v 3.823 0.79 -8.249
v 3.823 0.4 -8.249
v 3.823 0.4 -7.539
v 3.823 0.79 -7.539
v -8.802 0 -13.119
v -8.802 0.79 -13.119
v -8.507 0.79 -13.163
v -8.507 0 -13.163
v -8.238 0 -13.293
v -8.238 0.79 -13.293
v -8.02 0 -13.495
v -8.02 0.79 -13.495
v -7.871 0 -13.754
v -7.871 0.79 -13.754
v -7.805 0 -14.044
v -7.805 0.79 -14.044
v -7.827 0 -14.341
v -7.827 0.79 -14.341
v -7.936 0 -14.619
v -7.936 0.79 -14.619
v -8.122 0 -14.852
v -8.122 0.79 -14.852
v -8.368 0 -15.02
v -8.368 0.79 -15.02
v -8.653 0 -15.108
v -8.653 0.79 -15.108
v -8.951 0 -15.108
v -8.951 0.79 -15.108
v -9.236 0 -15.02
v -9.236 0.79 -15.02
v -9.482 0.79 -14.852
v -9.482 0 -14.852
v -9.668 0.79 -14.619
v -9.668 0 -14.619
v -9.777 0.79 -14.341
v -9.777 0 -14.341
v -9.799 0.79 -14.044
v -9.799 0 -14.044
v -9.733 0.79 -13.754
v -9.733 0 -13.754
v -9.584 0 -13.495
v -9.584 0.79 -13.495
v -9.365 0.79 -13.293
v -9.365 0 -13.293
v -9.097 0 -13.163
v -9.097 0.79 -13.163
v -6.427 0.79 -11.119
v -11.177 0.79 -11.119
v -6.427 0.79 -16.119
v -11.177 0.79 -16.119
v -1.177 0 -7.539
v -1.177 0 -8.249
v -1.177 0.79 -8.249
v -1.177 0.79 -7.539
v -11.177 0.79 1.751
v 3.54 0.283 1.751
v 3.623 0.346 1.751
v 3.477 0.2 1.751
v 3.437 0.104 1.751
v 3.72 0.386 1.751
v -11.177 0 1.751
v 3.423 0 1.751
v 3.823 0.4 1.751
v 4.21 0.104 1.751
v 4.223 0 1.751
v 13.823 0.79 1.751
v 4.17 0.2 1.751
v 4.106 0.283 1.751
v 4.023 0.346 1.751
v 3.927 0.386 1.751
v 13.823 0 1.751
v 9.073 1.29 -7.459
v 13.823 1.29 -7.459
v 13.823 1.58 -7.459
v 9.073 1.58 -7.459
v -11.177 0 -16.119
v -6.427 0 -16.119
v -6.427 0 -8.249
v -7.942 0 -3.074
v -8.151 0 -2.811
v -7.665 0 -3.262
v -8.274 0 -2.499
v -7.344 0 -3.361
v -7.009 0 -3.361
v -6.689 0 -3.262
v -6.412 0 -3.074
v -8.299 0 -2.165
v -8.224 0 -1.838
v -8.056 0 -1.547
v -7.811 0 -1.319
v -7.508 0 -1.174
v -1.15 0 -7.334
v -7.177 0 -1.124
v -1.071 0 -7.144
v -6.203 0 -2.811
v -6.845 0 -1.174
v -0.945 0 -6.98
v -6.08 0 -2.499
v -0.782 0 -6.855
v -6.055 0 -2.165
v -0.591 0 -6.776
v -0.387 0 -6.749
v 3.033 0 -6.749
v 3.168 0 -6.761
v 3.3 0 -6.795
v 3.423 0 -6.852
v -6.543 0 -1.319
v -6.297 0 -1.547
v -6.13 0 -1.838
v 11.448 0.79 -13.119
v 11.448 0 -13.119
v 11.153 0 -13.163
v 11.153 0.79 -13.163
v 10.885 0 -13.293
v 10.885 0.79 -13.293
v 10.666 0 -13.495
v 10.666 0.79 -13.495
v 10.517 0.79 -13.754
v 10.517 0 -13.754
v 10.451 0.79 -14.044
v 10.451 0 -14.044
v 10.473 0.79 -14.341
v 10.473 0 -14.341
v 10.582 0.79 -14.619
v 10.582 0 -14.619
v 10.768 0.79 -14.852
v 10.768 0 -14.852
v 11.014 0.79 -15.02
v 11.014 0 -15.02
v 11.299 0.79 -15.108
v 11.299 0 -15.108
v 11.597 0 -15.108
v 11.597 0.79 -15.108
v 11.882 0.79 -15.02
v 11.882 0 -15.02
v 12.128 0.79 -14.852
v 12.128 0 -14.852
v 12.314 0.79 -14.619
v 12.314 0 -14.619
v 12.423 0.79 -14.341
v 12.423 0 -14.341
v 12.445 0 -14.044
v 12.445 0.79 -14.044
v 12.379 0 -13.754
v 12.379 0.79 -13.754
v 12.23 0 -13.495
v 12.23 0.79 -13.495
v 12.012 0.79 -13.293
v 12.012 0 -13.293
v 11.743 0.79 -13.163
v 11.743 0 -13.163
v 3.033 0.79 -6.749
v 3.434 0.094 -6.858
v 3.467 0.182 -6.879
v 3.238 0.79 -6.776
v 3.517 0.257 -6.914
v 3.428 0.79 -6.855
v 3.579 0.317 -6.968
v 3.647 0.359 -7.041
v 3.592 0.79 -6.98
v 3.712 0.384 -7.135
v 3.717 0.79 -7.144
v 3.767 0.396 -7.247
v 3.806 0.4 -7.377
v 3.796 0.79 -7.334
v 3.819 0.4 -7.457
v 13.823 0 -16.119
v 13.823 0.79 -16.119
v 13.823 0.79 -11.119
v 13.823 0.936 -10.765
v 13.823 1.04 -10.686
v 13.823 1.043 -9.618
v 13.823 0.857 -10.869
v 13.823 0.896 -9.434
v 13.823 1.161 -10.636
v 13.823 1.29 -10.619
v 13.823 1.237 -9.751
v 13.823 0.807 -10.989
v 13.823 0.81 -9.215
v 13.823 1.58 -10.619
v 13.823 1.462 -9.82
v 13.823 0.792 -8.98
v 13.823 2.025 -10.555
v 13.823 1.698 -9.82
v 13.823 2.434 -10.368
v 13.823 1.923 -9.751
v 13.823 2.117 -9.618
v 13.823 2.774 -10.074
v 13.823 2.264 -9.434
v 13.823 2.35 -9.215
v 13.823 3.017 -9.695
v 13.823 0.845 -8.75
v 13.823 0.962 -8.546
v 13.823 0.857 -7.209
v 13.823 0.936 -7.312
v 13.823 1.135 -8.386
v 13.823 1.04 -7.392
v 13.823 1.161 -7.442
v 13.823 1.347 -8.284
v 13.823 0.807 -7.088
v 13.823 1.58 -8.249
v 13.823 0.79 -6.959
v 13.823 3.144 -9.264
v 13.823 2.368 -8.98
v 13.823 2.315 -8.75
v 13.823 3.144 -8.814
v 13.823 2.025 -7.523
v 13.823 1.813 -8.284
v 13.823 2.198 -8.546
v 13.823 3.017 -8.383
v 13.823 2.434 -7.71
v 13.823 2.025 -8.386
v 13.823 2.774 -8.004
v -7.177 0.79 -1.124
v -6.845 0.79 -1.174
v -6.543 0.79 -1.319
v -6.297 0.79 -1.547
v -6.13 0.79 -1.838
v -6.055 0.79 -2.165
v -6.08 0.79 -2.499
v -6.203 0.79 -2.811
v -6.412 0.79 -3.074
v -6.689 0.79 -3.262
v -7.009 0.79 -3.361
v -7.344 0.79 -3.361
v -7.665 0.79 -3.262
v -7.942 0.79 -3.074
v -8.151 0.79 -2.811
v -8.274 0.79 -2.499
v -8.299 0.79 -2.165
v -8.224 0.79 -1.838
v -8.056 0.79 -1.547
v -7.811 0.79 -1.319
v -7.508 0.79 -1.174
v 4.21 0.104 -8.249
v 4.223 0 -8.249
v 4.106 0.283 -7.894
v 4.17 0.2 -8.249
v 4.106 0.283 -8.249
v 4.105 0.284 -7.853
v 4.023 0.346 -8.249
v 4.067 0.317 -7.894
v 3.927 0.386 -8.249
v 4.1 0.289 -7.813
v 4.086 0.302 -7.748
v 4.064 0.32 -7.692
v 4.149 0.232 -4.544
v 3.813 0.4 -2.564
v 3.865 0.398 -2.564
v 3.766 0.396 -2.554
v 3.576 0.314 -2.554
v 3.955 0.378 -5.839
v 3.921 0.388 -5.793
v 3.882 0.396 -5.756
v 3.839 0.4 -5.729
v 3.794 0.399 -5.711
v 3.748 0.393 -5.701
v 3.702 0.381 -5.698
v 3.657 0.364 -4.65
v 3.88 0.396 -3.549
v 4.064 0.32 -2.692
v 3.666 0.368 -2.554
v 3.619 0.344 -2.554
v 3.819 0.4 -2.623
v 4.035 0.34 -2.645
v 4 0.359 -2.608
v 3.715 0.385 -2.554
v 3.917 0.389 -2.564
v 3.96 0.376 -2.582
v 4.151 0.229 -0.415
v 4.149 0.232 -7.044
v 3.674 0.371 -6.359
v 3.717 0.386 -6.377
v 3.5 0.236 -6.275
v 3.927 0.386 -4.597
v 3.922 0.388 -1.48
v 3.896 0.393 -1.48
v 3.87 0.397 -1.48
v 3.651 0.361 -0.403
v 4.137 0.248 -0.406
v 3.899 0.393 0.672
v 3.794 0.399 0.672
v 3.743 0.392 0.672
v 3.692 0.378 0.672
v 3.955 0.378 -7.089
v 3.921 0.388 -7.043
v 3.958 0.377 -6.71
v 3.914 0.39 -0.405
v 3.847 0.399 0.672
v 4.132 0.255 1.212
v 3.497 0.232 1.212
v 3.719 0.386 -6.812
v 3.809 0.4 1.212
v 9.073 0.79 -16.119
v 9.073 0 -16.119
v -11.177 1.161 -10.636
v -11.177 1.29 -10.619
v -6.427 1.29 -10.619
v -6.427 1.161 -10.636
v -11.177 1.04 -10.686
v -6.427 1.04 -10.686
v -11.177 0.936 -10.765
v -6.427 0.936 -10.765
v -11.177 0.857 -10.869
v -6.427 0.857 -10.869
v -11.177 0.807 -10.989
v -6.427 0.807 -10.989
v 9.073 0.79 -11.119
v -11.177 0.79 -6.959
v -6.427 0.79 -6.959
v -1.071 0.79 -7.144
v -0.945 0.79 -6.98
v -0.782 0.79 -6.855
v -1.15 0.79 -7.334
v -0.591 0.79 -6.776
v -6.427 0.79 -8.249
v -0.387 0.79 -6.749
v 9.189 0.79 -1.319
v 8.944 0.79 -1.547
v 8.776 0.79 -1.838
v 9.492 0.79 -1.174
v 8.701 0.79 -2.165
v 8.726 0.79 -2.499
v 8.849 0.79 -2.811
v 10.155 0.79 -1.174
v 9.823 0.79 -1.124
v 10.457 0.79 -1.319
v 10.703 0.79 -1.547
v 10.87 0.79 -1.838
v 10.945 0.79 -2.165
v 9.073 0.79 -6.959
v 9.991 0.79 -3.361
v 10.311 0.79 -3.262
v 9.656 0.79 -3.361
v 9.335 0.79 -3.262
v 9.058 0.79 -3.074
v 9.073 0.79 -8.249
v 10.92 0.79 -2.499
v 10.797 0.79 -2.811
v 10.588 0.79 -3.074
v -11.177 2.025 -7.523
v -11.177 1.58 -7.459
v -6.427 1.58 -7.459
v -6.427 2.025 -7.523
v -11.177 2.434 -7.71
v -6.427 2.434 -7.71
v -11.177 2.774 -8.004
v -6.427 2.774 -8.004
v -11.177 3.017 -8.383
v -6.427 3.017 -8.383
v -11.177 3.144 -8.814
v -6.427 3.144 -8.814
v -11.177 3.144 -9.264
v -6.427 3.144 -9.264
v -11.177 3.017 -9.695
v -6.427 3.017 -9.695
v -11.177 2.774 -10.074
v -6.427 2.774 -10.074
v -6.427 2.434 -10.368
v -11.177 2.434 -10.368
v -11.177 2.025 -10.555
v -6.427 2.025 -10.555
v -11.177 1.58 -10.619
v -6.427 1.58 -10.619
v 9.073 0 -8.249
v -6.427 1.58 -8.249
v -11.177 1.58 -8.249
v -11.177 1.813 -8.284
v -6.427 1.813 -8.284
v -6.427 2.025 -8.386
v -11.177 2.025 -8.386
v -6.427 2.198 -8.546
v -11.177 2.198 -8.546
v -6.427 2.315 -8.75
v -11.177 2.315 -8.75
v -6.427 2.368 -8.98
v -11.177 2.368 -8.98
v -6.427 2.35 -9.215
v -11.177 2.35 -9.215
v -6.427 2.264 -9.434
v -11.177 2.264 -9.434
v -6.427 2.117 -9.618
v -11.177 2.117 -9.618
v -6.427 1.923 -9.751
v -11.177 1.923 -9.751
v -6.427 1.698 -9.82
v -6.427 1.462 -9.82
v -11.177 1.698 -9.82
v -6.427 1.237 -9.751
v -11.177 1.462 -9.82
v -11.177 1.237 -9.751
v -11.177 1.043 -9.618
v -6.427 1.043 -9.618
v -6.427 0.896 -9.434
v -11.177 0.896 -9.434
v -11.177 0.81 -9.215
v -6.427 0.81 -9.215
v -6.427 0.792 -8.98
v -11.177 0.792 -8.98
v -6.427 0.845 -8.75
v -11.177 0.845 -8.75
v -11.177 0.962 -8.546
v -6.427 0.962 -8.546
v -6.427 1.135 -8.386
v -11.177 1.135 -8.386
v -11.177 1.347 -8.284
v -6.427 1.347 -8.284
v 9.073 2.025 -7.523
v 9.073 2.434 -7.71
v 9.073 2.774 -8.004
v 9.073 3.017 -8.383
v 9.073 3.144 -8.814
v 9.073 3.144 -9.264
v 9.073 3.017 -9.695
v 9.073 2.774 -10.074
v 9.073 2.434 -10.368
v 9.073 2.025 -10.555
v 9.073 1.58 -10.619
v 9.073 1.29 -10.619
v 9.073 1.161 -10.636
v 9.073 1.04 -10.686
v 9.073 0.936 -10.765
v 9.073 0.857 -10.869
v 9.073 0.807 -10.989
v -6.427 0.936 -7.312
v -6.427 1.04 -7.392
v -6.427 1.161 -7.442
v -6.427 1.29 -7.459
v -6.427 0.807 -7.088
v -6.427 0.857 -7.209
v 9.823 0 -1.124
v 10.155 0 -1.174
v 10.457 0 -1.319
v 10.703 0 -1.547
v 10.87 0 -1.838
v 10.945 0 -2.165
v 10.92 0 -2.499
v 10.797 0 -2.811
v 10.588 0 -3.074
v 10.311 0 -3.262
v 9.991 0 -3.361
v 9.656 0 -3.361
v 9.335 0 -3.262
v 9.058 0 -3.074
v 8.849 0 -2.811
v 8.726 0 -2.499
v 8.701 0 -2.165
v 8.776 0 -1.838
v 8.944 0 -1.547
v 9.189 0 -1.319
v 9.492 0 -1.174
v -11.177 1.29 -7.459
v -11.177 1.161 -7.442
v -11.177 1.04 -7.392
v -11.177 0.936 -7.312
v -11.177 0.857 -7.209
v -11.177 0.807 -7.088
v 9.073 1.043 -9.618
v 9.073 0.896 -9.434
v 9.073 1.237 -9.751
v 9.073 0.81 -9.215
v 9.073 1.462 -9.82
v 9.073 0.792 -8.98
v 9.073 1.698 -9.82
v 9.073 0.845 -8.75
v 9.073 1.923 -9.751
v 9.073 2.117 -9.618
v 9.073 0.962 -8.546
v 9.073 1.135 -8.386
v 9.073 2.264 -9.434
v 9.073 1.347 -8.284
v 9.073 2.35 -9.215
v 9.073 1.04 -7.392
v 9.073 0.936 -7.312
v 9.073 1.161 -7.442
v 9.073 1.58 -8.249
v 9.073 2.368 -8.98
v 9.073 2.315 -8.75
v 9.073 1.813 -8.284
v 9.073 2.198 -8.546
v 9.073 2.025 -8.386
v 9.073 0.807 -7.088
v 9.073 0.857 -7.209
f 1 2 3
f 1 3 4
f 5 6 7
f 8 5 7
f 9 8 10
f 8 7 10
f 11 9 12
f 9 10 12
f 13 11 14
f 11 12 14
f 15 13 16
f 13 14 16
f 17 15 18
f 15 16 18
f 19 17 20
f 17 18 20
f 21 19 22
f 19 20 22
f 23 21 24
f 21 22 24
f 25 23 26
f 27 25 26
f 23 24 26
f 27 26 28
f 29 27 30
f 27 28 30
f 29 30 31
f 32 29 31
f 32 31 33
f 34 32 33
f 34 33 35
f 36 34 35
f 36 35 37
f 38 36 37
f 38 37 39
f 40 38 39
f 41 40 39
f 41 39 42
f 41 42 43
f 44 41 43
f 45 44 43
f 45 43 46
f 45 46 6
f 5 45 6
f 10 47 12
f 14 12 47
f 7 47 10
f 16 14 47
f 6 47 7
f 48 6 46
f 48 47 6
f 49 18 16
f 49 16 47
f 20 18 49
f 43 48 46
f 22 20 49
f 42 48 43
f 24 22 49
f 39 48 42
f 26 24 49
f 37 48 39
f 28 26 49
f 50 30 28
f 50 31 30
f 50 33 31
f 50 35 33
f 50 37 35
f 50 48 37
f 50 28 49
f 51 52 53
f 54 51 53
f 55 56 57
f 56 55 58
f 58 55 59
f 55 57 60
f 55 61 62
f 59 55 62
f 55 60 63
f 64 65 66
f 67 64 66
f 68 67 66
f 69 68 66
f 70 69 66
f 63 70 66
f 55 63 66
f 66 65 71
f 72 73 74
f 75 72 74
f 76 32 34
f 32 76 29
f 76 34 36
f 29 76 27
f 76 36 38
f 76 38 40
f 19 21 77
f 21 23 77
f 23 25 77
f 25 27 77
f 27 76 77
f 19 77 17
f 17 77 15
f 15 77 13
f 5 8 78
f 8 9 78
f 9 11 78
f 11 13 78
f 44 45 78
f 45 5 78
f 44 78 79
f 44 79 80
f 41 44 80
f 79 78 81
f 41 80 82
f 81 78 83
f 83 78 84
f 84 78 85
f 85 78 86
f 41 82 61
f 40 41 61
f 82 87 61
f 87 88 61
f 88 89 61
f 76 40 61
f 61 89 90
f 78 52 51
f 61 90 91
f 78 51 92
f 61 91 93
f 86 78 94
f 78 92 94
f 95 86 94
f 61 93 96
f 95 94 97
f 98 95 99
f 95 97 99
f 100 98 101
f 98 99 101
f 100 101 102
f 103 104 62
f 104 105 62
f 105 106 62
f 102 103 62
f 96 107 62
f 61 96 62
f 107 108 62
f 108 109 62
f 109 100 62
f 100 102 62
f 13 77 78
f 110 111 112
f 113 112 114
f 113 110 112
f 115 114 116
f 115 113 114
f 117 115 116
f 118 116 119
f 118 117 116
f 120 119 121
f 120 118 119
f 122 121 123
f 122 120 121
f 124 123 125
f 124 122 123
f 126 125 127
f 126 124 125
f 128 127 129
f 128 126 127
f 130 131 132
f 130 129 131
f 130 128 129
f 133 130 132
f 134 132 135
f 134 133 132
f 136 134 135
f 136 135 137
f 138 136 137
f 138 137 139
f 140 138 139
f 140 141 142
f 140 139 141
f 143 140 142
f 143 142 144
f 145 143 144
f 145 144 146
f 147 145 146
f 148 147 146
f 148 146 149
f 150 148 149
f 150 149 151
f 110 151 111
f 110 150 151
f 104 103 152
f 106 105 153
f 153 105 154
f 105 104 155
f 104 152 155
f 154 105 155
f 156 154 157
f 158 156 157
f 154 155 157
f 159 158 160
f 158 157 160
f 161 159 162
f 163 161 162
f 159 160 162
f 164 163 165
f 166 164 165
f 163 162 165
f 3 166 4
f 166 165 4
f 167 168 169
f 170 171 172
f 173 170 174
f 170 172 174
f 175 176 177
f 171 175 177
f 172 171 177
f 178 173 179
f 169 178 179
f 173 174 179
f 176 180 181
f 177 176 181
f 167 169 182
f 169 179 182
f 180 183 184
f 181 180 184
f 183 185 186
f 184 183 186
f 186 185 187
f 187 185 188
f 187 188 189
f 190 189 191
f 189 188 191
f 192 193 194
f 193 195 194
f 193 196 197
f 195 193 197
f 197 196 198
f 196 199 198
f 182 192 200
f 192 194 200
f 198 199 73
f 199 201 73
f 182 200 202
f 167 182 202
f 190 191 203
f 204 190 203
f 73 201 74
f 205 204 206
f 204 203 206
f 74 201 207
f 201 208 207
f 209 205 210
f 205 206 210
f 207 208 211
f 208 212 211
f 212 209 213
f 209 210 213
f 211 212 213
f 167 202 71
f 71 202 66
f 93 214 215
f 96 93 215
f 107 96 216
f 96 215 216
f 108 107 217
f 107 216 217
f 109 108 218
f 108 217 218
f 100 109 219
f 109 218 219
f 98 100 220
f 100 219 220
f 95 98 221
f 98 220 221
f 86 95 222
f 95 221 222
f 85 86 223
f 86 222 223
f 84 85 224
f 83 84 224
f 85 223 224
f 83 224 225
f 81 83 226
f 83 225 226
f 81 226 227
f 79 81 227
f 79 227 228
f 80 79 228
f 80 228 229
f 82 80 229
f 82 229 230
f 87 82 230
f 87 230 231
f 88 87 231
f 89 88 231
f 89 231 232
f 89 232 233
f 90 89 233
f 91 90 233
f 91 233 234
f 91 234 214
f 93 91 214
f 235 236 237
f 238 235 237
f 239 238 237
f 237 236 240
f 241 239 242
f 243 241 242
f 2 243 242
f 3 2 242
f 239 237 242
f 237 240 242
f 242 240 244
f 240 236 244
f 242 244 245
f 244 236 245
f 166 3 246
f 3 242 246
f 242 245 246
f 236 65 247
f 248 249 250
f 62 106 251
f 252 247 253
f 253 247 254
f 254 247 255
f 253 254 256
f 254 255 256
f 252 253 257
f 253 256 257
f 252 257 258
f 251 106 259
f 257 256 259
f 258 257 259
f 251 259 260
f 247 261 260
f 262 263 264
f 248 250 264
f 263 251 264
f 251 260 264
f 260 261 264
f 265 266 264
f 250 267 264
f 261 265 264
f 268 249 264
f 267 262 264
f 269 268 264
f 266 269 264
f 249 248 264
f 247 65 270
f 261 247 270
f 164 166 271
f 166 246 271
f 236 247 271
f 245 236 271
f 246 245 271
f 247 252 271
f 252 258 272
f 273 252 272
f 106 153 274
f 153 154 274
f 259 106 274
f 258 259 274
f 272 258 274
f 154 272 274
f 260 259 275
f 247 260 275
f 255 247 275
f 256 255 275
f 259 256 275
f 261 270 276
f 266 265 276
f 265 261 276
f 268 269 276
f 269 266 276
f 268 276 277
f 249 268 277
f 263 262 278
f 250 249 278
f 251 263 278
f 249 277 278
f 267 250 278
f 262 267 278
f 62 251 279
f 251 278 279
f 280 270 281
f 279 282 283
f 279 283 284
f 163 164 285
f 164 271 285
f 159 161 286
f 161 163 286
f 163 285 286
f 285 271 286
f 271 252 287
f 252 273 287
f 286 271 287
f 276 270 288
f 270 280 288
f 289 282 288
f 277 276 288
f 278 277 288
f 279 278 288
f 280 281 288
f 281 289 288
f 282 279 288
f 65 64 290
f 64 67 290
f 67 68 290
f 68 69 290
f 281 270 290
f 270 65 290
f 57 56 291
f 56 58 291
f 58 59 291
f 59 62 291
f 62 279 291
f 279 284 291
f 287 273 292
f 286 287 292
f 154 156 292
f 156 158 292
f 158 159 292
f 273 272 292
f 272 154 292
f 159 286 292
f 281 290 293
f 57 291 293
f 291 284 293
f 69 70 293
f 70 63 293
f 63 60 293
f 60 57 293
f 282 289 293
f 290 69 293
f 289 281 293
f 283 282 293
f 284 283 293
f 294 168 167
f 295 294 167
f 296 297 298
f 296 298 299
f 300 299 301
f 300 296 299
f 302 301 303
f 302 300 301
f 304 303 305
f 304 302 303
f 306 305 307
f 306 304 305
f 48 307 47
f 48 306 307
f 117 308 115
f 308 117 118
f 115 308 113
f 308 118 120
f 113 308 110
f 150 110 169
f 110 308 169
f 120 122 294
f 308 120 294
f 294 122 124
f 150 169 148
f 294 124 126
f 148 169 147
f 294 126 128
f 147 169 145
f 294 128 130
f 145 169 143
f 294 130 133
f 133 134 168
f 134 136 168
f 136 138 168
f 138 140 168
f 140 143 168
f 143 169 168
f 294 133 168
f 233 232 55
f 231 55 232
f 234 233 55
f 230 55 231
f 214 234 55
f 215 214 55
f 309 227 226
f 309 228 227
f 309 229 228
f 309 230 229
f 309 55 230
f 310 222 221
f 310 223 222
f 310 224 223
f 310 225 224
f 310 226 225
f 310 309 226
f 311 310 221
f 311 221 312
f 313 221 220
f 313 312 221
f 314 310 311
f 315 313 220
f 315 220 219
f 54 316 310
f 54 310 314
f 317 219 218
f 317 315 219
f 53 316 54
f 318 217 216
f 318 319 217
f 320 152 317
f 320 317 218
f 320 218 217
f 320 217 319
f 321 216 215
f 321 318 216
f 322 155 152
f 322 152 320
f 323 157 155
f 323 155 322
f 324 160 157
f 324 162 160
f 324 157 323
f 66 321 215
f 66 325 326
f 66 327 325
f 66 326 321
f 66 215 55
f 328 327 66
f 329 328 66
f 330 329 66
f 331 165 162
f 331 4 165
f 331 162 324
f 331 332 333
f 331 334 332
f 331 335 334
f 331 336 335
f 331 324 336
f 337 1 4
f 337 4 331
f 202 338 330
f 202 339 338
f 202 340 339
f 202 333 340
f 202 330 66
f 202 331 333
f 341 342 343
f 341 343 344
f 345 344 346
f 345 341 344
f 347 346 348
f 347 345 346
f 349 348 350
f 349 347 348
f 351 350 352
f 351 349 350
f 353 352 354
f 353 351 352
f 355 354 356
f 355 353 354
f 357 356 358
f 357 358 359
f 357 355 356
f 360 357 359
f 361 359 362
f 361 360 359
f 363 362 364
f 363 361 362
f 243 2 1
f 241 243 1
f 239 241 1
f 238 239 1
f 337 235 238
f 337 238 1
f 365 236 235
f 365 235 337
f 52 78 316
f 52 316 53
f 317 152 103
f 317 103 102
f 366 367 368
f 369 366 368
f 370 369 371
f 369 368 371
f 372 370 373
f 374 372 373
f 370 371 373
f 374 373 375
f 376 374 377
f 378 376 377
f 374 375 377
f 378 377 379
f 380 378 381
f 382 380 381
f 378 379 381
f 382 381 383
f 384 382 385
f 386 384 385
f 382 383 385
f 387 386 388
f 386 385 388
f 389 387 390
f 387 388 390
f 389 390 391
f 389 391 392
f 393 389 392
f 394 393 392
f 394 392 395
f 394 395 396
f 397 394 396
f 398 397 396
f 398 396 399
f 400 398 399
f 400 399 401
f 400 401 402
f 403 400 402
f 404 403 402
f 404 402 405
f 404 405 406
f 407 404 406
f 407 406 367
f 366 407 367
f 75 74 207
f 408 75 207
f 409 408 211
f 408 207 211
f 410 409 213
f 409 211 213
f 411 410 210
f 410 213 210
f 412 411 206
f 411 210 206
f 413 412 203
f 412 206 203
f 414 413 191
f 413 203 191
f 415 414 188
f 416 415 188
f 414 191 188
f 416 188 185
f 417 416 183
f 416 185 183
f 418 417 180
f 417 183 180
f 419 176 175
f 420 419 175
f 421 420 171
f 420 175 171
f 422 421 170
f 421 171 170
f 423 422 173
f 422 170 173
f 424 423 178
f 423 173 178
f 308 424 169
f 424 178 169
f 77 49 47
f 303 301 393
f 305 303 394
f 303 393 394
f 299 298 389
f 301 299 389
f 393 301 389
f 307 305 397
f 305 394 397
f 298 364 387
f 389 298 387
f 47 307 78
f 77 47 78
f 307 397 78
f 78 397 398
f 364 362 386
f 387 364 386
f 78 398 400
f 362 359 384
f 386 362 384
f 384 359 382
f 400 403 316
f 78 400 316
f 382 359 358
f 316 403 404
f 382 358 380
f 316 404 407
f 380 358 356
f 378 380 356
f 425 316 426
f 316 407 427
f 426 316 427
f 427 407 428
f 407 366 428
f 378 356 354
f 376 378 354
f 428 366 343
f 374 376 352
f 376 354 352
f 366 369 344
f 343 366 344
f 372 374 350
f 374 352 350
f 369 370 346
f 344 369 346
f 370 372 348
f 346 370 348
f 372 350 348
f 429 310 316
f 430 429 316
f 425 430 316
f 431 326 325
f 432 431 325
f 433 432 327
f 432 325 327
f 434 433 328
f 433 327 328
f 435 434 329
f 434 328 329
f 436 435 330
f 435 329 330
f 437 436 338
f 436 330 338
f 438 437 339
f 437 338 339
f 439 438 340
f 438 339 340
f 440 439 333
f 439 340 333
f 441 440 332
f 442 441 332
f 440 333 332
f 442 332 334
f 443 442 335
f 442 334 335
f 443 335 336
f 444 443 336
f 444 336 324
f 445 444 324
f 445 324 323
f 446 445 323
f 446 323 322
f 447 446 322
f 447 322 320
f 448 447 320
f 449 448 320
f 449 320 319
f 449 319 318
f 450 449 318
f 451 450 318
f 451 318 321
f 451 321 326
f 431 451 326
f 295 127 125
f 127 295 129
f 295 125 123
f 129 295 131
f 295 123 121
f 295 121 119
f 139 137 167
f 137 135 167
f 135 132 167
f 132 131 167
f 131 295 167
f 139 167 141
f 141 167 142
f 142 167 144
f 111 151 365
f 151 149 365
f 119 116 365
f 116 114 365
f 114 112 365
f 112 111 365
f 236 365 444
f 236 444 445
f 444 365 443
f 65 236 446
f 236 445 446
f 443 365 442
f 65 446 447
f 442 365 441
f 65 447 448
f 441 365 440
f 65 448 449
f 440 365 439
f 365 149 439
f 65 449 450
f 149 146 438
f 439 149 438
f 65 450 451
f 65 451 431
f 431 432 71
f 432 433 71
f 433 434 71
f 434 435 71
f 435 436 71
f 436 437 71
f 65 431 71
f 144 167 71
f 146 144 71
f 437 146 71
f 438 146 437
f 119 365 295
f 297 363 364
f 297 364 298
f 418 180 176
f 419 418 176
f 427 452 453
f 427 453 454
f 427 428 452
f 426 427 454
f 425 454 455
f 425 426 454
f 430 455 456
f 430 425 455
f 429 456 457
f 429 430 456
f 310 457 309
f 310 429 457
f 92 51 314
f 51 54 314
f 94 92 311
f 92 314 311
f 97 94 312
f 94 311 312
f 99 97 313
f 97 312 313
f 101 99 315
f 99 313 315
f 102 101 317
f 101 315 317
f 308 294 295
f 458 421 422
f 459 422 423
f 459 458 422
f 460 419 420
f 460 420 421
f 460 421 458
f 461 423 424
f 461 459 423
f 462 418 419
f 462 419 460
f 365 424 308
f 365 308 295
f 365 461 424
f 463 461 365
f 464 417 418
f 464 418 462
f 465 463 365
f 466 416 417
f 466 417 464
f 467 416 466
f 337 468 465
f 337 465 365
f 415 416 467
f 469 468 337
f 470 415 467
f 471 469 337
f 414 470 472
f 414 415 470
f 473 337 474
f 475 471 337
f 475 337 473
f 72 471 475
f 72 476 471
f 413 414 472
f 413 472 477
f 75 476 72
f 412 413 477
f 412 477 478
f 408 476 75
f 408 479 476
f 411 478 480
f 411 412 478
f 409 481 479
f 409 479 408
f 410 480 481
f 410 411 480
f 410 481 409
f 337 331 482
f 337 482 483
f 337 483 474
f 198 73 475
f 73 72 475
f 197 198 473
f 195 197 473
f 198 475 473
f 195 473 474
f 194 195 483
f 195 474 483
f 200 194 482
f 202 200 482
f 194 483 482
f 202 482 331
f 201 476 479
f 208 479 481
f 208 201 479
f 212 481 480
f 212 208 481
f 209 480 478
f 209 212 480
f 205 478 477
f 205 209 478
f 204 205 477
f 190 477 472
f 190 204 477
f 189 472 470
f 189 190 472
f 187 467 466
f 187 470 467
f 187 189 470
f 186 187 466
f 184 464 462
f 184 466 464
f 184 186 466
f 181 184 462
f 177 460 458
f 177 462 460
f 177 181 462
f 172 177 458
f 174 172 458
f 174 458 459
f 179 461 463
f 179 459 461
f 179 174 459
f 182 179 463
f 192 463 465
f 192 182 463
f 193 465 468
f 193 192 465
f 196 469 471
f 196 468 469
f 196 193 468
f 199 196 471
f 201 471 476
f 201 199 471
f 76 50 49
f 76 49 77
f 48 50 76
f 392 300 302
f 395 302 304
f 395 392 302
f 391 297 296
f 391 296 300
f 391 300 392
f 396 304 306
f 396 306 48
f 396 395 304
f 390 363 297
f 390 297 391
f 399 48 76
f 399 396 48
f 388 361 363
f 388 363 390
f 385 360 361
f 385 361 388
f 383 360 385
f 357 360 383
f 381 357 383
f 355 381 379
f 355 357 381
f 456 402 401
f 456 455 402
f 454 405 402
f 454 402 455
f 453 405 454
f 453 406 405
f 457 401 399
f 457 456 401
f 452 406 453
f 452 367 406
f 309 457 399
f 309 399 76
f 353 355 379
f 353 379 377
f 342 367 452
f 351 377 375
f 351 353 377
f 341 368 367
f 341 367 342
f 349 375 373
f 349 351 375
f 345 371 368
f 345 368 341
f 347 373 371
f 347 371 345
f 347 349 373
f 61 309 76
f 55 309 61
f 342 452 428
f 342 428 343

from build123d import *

# Parameters (mm, degrees)
SKETCH1_W                     = 25
SKETCH1_H                     = 10
BASE_PLATE_DEPTH              = 0.79
PINHOLDER_DEPTH               = 4.75
SKETCH4_R                     = 0.79
PIN_SHAFT_DEPTH               = 30.913269547
SKETCH5_R                     = 1.125
SCREW_HOLES_DEPTH             = 4
SKETCH11_R                    = 1
SET_SCREW_HOLE_DEPTH          = 1.5
MIRRORED_FILLETS_R            = 0.5
MIRRORED_FILLETS_OF_MIRROR1_R = 0.5
SKETCH9_RX                    = 0.4
SKETCH9_RY                    = 0.4
SKETCH10_W                    = 5
SKETCH10_H                    = 0.79
SPRING_GROOVE_DEPTH           = 1.5
FILLET2_R                     = 0.79


with BuildPart() as part:
    # Sketch1 → Base Plate (new body)
    with BuildSketch(Plane(origin=(0, 0, 0), x_dir=(1, 0, 0), z_dir=(0, 1, 0))):
        with Locations((1.323198198, 3.248873874)):
            Rectangle(SKETCH1_W, SKETCH1_H)
    extrude(amount=BASE_PLATE_DEPTH)

    # Sketch2 → PinHolder (add)
    with BuildSketch(Plane.ZY.offset(11.176801802)):
        with BuildLine():
            Line((-8.248873874, 0), (-8.248873874, 0.79))
            Line((-8.248873874, 0.79), (-7.458873874, 0.79))
            Line((-7.458873874, 0.79), (-7.458873874, 1.58))
            ThreePointArc((-7.458873874, 1.58), (-9.038873874, 3.16), (-10.618873874, 1.58))
            Line((-10.618873874, 1.58), (-10.618873874, 1.29))
            ThreePointArc((-10.618873874, 1.29), (-10.765320483, 0.936446609), (-11.118873874, 0.79))
            Line((-11.118873874, 0.79), (-16.118873874, 0.79))
            Line((-16.118873874, 0.79), (-16.118873874, 0))
            Line((-16.118873874, 0), (-11.426644498, 0))
            Line((-11.426644498, 0), (-8.248873874, 0))
        make_face()
    pinholder = extrude(amount=-PINHOLDER_DEPTH)

    # Sketch4 → Pin Shaft (cut, through all)
    with BuildSketch(Plane.ZY.offset(11.176801802)):
        with Locations((-9.038873874, 1.58)):
            Circle(SKETCH4_R)
    pin_shaft = extrude(amount=-PIN_SHAFT_DEPTH, mode=Mode.SUBTRACT)

    # Sketch5 → Screw Holes (cut)
    with BuildSketch(Plane(origin=(0, 0.79, 0), x_dir=(1, 0, 0), z_dir=(0, 1, 0))):
        with Locations(Location((-7.176801802, 2.248873874, 0), (0, 0, 270))):
            Circle(SKETCH5_R)
        with Locations(Location((9.823198198, 2.248873874, 0), (0, 0, 270))):
            Circle(SKETCH5_R)
    extrude(amount=-SCREW_HOLES_DEPTH, mode=Mode.SUBTRACT)

    # Sketch11 → Set Screw Hole (cut)
    with BuildSketch(Plane(origin=(0, 0.79, 0), x_dir=(1, 0, 0), z_dir=(0, 1, 0))):
        with Locations(Location((-8.801801802, 14.118873874, 0), (0, 0, 270))):
            Circle(SKETCH11_R)
    set_screw_hole = extrude(amount=-SET_SCREW_HOLE_DEPTH, mode=Mode.SUBTRACT)

    # Mirrored Fillets
    mirrored_fillets_edges = [part.edges().sort_by_distance(p)[0] for p in [
        (-8.801801802, 0.79, -7.458873874),
    ]]
    fillet(mirrored_fillets_edges, radius=MIRRORED_FILLETS_R)

    # Mirror1: PinHolder, Pin Shaft, Set Screw Hole across plane
    add(pinholder.mirror(Plane(origin=(1.323198198, 0, 0), x_dir=(0, 0, 1), z_dir=(1, 0, 0))))
    add(pin_shaft.mirror(Plane(origin=(1.323198198, 0, 0), x_dir=(0, 0, 1), z_dir=(1, 0, 0))), mode=Mode.SUBTRACT)
    add(set_screw_hole.mirror(Plane(origin=(1.323198198, 0, 0), x_dir=(0, 0, 1), z_dir=(1, 0, 0))), mode=Mode.SUBTRACT)

    # Mirrored Fillets of Mirror1
    mirrored_fillets_of_mirror1_edges = [part.edges().sort_by_distance(p)[0] for p in [
        (11.448198198, 0.79, -7.458873874),
    ]]
    fillet(mirrored_fillets_of_mirror1_edges, radius=MIRRORED_FILLETS_OF_MIRROR1_R)

    # Wire Groove: sweep along a path in Sketch8
    with BuildLine(Plane.XZ) as wire_groove_path:
        Line((3.823198198, -8.248873874), (3.823198198, 1.751126126))
    # Sketch9 → Wire Groove (sweep, cut)
    with BuildSketch(Plane.XY.offset(1.751126126)):
        with Locations((3.823198198, 0)):
            Ellipse(SKETCH9_RX, SKETCH9_RY)
    sweep(path=wire_groove_path.line, mode=Mode.SUBTRACT)

    # Sketch10 → Spring Groove (cut)
    with BuildSketch(Plane(origin=(0, 0, -8.248873874), x_dir=(-1, 0, 0), z_dir=(0, 0, -1))):
        with Locations((-1.323198198, 0.395)):
            Rectangle(SKETCH10_W, SKETCH10_H)
    extrude(amount=-SPRING_GROOVE_DEPTH, mode=Mode.SUBTRACT)

    # Fillet2
    fillet2_edges = [part.edges().sort_by_distance(p)[0] for p in [
        (-1.176801802, 0.395, -6.748873874),
        (3.823198198, 0.595, -6.748873874),
    ]]
    fillet(fillet2_edges, radius=FILLET2_R)


solid = part.part
